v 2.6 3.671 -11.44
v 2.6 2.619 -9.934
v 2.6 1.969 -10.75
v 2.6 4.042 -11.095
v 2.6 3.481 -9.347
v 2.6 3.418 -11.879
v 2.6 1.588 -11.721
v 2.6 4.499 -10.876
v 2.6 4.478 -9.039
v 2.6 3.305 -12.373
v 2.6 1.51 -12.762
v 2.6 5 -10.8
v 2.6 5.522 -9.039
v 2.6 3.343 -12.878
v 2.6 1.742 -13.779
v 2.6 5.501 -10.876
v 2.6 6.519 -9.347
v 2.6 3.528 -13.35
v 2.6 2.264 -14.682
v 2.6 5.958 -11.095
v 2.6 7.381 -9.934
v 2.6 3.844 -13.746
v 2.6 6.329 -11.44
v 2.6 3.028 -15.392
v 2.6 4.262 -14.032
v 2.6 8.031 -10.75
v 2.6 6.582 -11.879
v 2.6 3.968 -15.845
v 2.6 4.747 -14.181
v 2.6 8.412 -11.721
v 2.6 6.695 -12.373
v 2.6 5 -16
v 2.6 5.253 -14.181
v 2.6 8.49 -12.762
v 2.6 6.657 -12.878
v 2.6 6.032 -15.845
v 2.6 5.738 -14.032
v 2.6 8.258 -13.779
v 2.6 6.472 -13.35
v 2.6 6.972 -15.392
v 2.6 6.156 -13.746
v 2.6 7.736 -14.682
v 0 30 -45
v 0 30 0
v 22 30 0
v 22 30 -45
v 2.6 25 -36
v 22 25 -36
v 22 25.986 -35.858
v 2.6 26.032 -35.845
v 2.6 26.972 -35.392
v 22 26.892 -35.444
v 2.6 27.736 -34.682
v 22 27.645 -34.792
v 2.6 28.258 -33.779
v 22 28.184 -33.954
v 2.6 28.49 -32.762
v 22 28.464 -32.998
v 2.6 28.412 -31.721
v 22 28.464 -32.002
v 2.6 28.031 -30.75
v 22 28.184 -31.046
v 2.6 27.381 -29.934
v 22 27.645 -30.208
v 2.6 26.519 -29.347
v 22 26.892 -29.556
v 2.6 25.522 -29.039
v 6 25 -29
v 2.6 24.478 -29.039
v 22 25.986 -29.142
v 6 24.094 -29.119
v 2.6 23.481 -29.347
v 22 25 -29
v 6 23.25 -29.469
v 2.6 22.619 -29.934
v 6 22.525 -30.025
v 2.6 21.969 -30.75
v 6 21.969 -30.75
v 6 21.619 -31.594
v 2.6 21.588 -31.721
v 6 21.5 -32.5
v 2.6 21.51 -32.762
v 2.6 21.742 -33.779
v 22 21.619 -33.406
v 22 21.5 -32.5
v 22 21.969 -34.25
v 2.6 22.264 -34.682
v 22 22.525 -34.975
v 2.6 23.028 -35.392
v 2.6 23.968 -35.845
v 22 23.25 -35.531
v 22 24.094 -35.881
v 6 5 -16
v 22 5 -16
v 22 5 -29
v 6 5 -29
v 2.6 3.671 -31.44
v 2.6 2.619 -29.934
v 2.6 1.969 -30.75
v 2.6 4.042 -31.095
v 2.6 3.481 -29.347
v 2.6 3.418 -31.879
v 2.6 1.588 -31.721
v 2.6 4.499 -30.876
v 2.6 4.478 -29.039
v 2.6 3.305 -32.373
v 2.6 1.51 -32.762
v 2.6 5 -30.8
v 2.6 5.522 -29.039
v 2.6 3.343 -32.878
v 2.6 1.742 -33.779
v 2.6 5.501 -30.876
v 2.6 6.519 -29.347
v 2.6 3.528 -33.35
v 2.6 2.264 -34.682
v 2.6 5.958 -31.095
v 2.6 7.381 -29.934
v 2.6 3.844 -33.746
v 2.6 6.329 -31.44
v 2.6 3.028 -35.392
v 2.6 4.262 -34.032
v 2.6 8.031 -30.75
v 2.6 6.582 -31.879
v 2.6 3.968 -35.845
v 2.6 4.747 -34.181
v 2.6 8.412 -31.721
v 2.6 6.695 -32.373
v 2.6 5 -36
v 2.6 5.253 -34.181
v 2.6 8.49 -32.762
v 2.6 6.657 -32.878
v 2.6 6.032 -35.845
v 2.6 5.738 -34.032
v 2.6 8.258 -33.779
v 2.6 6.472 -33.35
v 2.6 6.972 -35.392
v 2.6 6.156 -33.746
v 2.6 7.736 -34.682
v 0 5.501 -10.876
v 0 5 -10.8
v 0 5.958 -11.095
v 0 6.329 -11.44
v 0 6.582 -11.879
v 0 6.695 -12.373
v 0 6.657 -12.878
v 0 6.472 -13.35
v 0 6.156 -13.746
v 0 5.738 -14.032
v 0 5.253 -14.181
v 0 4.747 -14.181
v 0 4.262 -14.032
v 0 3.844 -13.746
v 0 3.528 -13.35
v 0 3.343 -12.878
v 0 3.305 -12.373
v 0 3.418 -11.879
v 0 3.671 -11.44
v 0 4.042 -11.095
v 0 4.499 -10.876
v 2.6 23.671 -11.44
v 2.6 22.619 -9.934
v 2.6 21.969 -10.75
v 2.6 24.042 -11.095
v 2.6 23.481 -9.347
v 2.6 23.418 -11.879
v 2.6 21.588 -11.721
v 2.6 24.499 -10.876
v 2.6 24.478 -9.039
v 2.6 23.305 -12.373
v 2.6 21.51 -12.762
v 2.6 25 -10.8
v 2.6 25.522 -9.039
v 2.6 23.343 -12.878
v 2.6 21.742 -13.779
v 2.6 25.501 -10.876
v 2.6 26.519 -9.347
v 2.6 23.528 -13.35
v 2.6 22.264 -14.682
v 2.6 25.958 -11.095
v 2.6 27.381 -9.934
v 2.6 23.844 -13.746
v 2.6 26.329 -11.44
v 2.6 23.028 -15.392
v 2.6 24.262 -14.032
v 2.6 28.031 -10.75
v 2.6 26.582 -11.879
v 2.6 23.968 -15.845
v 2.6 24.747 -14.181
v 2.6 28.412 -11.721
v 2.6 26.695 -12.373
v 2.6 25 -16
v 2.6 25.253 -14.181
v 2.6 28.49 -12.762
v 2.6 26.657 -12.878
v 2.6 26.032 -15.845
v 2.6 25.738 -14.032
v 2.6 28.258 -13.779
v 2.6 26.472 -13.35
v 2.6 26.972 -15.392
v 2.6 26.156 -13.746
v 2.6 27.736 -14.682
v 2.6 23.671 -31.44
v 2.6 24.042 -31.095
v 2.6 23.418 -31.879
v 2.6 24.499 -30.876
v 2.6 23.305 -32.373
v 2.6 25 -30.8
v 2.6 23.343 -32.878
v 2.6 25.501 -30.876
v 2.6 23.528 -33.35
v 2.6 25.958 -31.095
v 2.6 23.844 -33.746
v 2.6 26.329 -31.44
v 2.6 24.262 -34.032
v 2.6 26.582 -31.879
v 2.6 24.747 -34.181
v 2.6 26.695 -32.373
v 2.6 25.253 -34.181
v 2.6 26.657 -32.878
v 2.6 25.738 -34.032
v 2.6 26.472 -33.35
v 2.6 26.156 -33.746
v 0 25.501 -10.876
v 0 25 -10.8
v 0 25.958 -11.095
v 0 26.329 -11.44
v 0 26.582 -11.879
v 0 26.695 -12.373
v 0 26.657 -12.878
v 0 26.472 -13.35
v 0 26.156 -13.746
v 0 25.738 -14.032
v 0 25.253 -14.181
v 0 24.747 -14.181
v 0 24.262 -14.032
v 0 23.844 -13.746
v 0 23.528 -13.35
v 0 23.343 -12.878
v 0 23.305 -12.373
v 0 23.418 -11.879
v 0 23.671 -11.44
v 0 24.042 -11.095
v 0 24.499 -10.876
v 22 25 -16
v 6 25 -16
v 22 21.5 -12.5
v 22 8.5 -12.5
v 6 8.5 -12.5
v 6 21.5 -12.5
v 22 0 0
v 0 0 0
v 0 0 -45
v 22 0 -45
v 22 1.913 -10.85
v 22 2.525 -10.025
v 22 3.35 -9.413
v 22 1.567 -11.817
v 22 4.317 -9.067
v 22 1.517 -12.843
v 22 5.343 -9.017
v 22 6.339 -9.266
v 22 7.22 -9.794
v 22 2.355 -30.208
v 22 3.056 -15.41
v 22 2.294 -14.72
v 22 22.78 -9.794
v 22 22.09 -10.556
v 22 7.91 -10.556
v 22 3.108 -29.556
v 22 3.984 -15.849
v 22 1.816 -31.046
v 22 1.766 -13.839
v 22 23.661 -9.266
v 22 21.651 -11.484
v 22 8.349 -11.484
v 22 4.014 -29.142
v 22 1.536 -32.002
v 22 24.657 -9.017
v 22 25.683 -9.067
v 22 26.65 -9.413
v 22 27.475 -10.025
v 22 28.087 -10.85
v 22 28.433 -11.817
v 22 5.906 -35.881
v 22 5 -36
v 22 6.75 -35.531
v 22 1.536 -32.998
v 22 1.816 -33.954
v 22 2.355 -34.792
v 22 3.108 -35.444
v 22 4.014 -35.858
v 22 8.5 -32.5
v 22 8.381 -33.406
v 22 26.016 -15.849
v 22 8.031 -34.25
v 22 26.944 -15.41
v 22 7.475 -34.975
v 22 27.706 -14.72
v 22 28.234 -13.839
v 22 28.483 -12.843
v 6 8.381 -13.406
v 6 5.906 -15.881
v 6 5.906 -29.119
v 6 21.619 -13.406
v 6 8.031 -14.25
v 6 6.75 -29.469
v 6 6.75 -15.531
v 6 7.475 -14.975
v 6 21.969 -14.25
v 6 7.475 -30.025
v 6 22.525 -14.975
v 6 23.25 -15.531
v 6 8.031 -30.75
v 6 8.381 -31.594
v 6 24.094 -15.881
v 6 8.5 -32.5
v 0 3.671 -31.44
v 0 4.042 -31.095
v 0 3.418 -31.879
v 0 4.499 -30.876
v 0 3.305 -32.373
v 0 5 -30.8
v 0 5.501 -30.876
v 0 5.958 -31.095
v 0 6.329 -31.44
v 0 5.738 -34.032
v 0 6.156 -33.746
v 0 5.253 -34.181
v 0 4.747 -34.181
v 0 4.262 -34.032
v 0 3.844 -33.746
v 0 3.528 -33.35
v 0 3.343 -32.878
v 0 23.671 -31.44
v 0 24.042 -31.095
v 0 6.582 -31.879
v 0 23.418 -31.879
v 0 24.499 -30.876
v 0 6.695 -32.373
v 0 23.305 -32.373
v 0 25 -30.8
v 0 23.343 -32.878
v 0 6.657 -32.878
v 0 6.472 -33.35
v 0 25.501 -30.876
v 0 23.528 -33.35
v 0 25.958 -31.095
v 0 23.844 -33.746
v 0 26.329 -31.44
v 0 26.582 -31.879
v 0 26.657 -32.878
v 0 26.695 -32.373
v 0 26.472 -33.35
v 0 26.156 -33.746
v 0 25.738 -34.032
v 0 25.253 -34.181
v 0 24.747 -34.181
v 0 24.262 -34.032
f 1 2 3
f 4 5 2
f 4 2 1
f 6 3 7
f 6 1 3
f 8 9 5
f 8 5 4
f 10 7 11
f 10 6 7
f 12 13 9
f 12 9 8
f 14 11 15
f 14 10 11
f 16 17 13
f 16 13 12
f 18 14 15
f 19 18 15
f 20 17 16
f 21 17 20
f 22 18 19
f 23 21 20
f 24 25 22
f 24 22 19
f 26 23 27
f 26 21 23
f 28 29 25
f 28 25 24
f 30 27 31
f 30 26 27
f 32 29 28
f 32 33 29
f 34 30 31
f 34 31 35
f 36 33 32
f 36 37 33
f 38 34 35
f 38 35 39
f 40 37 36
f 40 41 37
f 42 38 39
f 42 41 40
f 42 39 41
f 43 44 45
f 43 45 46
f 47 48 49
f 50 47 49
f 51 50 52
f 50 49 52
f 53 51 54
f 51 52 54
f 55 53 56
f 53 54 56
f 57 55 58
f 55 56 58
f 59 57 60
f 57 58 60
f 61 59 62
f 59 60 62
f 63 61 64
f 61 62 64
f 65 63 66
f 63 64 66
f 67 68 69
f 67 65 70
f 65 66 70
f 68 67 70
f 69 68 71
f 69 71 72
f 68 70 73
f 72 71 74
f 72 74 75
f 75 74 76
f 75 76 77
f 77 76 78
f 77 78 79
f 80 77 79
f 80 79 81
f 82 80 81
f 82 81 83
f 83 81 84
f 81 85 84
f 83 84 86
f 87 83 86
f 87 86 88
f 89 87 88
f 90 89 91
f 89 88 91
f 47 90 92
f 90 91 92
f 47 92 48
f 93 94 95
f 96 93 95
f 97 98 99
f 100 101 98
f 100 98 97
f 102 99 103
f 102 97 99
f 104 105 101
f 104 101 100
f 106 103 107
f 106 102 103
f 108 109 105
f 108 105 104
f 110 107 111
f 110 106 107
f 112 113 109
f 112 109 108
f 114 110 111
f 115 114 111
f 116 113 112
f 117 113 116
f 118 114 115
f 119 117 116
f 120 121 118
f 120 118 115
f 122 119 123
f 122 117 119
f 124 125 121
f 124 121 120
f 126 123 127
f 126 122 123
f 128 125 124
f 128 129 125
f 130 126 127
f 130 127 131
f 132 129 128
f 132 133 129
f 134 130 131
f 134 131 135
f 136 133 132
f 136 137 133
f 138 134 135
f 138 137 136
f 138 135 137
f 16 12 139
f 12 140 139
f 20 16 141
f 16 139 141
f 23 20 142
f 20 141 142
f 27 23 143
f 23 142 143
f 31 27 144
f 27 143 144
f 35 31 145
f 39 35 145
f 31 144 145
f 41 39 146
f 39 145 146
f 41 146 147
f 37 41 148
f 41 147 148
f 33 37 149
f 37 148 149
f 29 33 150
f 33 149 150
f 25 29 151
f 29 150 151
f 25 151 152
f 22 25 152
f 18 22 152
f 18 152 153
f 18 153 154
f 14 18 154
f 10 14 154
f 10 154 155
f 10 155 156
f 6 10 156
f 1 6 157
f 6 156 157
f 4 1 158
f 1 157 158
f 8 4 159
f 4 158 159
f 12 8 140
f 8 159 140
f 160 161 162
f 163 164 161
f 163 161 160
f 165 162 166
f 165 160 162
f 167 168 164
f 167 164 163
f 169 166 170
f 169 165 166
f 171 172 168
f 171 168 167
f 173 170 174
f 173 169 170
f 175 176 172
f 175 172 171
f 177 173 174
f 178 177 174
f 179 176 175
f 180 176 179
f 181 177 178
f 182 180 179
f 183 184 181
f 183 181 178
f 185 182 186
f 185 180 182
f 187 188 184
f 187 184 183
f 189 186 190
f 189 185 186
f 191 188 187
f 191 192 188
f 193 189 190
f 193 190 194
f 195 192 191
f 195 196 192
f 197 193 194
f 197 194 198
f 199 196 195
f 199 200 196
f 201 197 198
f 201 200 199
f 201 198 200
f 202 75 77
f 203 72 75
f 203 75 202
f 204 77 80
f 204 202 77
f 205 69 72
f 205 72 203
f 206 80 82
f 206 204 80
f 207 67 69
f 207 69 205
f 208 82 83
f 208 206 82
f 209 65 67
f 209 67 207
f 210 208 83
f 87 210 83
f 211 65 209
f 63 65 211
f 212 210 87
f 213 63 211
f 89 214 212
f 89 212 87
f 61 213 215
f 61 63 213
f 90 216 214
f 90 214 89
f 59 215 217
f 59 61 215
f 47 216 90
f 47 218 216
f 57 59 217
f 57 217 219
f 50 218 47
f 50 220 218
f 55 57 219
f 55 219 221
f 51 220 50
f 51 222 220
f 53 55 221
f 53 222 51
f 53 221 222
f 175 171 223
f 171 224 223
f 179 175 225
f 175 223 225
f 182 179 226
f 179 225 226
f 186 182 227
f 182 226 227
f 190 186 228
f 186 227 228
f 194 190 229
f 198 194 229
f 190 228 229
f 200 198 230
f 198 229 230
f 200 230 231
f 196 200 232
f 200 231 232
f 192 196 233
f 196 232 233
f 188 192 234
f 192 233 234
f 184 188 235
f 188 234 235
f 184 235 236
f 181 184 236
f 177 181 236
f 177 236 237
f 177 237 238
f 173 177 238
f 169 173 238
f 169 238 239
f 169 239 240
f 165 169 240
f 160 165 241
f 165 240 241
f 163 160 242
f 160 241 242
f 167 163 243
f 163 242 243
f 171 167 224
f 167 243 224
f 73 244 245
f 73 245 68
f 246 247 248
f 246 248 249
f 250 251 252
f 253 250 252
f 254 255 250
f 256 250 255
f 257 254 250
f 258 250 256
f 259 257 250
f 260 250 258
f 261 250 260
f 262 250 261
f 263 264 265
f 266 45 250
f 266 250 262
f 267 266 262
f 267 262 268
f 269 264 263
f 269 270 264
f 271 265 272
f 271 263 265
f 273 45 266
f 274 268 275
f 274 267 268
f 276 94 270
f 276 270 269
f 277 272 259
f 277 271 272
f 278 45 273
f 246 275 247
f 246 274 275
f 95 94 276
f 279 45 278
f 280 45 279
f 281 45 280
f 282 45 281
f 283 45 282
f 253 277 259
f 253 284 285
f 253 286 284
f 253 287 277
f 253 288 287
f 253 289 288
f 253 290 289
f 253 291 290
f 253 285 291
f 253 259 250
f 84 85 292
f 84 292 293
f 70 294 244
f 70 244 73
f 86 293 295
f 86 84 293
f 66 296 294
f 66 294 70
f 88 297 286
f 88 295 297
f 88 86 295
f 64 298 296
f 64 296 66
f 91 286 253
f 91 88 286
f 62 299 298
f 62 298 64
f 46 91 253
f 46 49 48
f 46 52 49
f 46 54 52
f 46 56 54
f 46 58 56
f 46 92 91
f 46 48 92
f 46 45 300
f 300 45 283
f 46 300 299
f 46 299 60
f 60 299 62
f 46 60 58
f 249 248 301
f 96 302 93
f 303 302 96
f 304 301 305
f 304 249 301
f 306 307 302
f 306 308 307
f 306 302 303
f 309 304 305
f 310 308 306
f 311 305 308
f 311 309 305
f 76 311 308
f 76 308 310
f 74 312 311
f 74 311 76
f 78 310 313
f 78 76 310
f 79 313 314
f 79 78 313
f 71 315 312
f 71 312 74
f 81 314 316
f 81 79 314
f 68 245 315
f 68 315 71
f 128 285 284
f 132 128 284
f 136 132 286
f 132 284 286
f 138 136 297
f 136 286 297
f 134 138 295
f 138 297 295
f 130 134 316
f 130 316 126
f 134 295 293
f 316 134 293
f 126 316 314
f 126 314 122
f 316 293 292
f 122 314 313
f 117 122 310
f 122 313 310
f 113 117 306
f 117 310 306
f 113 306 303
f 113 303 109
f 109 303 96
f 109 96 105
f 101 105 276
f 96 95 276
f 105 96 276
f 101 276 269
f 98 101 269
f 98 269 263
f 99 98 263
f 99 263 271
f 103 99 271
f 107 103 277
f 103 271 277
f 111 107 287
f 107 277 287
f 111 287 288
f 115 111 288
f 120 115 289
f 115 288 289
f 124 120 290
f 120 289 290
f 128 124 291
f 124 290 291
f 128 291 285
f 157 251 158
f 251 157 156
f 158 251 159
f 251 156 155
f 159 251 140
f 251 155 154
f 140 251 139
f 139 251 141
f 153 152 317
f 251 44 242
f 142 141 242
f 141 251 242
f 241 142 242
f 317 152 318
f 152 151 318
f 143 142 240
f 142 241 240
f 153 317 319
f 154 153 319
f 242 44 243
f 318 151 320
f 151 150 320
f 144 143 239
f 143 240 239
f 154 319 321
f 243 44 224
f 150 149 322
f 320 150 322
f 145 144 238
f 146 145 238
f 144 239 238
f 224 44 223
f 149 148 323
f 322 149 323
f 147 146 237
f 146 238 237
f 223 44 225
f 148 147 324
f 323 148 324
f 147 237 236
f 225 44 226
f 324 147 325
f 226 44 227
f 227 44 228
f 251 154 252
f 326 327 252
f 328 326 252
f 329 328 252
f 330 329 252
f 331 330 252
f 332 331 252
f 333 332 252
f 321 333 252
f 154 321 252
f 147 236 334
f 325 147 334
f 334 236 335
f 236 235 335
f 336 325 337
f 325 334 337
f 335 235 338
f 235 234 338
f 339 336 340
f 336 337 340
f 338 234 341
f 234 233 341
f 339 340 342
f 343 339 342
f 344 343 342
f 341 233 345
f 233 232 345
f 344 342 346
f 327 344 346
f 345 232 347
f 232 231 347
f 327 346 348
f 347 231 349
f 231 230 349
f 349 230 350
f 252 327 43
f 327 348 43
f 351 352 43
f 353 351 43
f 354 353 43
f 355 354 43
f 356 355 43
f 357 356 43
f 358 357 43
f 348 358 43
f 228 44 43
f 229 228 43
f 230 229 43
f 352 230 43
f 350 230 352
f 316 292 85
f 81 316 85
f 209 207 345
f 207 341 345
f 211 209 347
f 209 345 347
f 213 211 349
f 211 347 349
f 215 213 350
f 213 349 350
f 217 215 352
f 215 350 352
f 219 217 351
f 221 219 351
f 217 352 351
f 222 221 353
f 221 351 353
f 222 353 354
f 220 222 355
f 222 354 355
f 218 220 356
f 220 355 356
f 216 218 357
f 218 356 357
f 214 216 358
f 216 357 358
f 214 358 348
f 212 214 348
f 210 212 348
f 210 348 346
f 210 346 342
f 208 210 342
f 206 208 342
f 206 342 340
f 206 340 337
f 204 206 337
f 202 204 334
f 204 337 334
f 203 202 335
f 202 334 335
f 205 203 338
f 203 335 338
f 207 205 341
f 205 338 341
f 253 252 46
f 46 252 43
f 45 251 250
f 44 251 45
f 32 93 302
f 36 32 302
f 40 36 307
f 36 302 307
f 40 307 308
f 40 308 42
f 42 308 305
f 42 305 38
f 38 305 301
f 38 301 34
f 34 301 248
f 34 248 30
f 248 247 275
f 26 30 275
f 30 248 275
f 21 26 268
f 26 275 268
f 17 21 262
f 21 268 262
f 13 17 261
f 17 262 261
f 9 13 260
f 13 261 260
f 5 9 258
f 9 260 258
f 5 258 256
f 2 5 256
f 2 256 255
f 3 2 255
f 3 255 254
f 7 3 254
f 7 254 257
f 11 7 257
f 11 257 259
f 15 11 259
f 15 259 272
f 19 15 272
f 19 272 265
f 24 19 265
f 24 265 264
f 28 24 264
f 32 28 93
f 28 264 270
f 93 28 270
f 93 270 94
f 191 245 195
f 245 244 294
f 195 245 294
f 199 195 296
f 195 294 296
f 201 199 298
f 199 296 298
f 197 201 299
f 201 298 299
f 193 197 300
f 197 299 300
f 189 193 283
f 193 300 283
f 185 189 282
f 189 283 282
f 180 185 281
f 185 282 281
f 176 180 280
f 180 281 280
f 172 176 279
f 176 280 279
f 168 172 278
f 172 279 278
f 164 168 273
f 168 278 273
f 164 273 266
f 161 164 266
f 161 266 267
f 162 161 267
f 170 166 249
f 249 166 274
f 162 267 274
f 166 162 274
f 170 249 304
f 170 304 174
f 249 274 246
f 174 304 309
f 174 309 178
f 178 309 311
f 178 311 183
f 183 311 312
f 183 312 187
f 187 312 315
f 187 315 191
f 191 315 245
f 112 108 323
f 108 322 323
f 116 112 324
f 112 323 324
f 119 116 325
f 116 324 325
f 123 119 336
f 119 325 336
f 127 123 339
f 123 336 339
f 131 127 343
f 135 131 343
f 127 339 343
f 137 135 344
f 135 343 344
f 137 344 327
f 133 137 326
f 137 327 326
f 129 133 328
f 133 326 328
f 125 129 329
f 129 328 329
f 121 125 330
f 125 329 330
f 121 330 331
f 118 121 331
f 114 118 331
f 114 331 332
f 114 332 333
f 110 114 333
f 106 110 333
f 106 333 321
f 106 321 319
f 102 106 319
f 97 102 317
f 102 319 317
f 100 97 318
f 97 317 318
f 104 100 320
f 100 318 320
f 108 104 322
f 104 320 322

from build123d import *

# Parameters (mm, degrees)
SKETCH1_W                                = 45
SKETCH1_H                                = 30
BOSS_EXTRUDE1_DEPTH                      = 22
SKETCH3_W                                = 20
SKETCH3_H                                = 20
CUT_EXTRUDE1_DEPTH                       = 16
CBORE_FOR_M3_PAN_HEAD_SCREW4_D           = 3.4
CBORE_FOR_M3_PAN_HEAD_SCREW4_CBORE_D     = 7
CBORE_FOR_M3_PAN_HEAD_SCREW4_CBORE_DEPTH = 19.4


with BuildPart() as part:
    # Sketch1 → Boss-Extrude1 (new body)
    with BuildSketch(Plane(origin=(0, 0, 0), x_dir=(0, 0, -1), z_dir=(1, 0, 0))):
        with Locations((22.5, 15)):
            Rectangle(SKETCH1_W, SKETCH1_H)
    extrude(amount=BOSS_EXTRUDE1_DEPTH)

    # Sketch3 → Cut-Extrude1 (cut)
    with BuildSketch(Plane(origin=(22, 0, 0), x_dir=(0, 0, -1), z_dir=(1, 0, 0))):
        with Locations((22.5, 15)):
            Rectangle(SKETCH3_W, SKETCH3_H)
    extrude(amount=-CUT_EXTRUDE1_DEPTH, mode=Mode.SUBTRACT)

    # CBORE for M3 Pan Head Screw4 (through all)
    with Locations(Plane(origin=(22, 0, 0), x_dir=(0, 0, -1), z_dir=(1, 0, 0))):
        with Locations((12.5, 25), (32.5, 25), (32.5, 5), (12.5, 5)):
            CounterBoreHole(CBORE_FOR_M3_PAN_HEAD_SCREW4_D / 2, CBORE_FOR_M3_PAN_HEAD_SCREW4_CBORE_D / 2, CBORE_FOR_M3_PAN_HEAD_SCREW4_CBORE_DEPTH)


solid = part.part
